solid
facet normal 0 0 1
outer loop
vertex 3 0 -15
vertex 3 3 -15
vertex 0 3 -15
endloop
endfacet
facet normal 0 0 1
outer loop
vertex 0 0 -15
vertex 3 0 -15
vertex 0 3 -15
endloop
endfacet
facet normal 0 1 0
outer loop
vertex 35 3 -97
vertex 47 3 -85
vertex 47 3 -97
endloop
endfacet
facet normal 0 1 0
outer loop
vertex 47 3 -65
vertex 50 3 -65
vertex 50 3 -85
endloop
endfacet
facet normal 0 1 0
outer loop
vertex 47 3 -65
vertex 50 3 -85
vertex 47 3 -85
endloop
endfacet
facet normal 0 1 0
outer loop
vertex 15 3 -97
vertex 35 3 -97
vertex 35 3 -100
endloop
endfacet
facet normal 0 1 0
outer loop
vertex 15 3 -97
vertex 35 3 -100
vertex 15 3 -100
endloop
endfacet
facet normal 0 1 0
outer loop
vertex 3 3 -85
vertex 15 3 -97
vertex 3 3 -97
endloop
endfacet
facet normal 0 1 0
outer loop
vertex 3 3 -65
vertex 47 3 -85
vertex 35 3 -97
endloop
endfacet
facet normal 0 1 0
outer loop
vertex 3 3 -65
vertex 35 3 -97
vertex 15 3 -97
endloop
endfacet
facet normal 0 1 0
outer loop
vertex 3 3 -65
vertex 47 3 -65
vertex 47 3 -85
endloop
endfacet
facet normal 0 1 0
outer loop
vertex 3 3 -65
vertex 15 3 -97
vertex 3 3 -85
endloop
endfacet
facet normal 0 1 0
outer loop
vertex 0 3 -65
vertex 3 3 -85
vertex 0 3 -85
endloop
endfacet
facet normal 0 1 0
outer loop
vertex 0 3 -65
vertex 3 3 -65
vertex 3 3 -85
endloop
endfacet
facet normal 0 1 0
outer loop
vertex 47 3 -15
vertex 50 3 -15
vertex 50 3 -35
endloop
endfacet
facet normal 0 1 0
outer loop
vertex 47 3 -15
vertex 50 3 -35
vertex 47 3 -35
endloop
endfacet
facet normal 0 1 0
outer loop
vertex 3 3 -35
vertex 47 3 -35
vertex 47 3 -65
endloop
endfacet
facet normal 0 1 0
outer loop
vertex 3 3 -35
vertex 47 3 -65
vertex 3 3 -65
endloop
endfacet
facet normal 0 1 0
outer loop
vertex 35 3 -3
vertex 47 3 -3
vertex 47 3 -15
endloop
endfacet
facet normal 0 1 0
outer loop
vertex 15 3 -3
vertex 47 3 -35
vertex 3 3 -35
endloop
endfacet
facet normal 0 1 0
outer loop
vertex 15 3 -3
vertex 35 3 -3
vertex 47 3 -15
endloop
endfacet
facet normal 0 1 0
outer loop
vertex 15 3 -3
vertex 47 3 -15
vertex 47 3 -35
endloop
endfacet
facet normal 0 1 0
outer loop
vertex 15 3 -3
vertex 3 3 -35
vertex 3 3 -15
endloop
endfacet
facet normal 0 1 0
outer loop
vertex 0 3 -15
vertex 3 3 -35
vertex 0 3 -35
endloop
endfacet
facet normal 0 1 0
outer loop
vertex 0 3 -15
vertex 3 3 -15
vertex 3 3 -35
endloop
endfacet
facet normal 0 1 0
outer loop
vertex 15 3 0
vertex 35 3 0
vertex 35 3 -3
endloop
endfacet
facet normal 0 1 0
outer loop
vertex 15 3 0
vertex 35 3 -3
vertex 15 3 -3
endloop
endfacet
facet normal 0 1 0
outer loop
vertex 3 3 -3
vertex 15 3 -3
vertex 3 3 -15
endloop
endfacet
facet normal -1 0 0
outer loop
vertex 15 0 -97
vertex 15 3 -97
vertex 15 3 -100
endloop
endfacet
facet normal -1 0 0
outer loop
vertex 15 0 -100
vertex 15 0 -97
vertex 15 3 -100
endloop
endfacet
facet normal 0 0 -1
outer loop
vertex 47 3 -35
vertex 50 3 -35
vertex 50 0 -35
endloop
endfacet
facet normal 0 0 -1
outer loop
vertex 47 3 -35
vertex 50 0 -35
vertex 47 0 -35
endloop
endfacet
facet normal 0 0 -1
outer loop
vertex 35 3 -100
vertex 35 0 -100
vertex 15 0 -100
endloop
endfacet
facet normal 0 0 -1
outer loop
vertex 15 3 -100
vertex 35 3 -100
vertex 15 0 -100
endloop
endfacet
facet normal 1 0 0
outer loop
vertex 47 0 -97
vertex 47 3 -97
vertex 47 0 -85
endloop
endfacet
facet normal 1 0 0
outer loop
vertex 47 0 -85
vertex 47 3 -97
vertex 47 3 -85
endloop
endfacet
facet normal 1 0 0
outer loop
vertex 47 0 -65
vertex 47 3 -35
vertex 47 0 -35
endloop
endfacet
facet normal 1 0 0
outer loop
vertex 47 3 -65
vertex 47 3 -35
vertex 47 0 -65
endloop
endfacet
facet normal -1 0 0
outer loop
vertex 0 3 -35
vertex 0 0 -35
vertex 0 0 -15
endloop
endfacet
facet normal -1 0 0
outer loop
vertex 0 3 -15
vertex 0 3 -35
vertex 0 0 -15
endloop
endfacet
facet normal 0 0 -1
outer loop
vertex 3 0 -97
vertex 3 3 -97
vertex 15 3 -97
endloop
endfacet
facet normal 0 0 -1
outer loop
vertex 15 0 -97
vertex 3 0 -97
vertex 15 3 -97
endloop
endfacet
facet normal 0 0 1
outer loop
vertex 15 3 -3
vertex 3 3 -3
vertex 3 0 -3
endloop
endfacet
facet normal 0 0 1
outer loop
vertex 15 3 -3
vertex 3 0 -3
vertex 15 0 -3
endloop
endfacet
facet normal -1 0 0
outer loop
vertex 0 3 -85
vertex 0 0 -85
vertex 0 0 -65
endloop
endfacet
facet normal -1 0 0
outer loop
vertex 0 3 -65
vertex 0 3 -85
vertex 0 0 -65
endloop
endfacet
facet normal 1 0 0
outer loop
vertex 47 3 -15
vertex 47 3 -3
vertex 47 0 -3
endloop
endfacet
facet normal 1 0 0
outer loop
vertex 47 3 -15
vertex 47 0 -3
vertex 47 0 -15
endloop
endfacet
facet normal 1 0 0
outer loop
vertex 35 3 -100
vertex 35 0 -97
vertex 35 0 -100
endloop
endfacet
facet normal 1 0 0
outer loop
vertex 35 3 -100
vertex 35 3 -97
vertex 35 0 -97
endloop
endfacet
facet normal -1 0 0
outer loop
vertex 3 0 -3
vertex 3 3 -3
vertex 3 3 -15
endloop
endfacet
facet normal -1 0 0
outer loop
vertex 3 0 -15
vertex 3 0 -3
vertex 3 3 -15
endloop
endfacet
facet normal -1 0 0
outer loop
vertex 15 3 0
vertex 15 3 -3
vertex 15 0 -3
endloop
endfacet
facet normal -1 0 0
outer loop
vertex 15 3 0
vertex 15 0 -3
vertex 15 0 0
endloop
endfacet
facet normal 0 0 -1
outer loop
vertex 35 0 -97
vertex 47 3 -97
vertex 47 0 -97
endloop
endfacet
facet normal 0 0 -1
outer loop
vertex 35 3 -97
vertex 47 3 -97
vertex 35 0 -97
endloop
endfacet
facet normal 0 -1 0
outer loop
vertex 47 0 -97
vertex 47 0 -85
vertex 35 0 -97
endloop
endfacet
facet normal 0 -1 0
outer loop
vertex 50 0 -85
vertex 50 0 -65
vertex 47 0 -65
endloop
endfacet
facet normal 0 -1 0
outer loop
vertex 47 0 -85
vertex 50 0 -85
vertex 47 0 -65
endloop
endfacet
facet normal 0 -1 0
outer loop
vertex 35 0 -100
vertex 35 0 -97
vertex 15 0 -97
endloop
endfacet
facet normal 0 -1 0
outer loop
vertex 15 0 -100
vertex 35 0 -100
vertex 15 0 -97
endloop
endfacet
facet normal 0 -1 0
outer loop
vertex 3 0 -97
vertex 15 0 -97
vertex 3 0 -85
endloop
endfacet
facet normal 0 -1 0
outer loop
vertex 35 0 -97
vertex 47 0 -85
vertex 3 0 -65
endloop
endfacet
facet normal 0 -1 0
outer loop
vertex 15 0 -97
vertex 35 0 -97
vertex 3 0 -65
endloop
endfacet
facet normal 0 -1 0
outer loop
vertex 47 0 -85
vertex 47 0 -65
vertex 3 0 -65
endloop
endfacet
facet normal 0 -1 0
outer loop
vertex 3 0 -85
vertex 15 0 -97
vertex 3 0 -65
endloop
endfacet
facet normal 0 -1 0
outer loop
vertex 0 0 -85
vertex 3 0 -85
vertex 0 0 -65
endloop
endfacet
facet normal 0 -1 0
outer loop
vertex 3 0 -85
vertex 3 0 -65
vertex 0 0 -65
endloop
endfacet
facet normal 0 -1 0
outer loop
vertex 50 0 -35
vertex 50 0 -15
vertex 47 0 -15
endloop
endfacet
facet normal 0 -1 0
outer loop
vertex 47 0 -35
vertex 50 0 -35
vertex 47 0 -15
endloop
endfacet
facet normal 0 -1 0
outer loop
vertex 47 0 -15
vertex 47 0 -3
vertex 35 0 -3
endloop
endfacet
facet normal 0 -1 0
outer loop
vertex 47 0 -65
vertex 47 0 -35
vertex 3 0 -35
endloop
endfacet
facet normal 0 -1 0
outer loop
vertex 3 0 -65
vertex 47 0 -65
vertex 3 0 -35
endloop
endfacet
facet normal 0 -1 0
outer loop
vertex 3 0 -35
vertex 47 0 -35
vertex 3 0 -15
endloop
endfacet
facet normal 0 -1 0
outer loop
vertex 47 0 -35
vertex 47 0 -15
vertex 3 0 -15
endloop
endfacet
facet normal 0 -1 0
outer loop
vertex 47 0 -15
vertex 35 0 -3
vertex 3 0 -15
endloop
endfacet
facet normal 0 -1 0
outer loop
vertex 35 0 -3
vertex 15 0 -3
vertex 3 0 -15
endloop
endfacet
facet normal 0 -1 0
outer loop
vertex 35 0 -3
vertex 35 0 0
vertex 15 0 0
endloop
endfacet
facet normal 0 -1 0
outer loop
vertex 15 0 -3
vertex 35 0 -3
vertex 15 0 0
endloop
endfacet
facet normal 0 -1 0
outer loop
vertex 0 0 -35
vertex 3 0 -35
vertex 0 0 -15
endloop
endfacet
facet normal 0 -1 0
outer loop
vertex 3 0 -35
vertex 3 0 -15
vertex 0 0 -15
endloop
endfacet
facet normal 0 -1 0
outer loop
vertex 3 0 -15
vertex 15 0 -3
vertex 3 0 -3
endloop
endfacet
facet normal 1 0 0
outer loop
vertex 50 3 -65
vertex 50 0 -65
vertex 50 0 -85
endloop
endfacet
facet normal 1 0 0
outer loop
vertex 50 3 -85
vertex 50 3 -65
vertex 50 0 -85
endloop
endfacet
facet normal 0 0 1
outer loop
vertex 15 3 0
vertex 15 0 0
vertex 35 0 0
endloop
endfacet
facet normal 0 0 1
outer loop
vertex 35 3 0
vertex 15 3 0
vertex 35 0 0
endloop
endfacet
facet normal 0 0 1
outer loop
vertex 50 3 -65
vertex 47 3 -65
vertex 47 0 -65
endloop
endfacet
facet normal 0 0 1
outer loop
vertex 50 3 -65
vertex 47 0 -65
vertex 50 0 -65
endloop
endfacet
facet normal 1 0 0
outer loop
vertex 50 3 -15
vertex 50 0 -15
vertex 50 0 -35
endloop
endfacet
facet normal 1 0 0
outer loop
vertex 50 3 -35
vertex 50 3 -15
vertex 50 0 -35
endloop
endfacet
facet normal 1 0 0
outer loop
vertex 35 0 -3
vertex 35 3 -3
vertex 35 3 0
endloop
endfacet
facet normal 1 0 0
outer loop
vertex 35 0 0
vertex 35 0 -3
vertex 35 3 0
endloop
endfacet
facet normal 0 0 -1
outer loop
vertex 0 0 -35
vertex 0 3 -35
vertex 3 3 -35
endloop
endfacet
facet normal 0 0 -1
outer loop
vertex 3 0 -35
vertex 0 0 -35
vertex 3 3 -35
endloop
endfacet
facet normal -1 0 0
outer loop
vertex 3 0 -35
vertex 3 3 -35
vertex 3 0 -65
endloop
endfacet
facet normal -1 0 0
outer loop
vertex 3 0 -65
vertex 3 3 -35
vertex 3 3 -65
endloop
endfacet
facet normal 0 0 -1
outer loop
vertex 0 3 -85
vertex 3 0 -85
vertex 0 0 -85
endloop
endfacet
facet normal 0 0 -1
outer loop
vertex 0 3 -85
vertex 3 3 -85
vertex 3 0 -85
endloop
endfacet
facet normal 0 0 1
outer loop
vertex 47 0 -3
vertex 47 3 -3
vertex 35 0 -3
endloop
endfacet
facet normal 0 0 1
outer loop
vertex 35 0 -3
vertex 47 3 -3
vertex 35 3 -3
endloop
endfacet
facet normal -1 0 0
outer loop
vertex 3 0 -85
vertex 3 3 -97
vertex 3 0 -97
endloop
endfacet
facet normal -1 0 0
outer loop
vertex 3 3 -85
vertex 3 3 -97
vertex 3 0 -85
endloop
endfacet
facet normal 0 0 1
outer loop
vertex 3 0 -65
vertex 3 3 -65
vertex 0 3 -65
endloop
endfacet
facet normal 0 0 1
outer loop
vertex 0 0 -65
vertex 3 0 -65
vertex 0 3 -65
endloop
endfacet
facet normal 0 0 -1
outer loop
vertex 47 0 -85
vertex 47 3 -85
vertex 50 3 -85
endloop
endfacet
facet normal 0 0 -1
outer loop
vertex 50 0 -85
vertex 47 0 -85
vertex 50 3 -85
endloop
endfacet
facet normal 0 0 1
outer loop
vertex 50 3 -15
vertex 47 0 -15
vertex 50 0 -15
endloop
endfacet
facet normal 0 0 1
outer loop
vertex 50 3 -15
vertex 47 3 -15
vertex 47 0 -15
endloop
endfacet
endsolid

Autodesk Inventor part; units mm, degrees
ref_plane "YZ Plane" through (0, 0, 0) normal (1, 0, 0) x (0, 1, 0)
ref_plane "XZ Plane" through (0, 0, 0) normal (0, 1, 0) x (-1, 0, 0)
ref_plane "XY Plane" through (0, 0, 0) normal (0, 0, 1) x (1, 0, 0)
sketch "Sketch1" plane through (0, 0, 0) normal (0, 1, 0) x (-1, 0, 0)
  line L0 (0, 0) -> (-50, 0)
  line L1 (-50, 0) -> (-50, -100)
  line L2 (-50, -100) -> (0, -100)
  line L3 (0, -100) -> (0, 0)
  dimension "d0" = 100
  dimension "d1" = 50
extrude "Base" add sketch "Sketch1" along normal blind 3
sketch "Sketch2" plane through (0, 3, 0) normal (0, 1, 0) x (1, 0, 0)
  line L0 (0, 0) -> (50, 0) projected
  line L1 (50, 100) -> (0, 100) projected
  line L2 (0, 0) -> (3, 0)
  line L3 (3, 100) -> (0, 100)
  line L4 (0, 100) -> (0, 0)
  line L5 (0, 100) -> (0, 0) projected
  line L6 (0, 0) -> (3, 0)
  line L7 (3, 0) -> (3, 15)
  line L8 (3, 15) -> (0, 15)
  line L9 (0, 15) -> (0, 0)
  line L10 (0, 100) -> (3, 100)
  line L11 (3, 100) -> (3, 85)
  line L12 (3, 85) -> (0, 85)
  line L13 (0, 85) -> (0, 100)
  line L14 (0, 35) -> (3, 35)
  line L15 (3, 35) -> (3, 65)
  line L16 (3, 65) -> (0, 65)
  line L17 (0, 65) -> (0, 35)
  line L18 (25, 0) -> (25, 100) construction
  line L19 (50, 0) -> (47, 0)
  line L20 (47, 100) -> (50, 100)
  line L21 (50, 100) -> (50, 0)
  line L22 (50, 100) -> (50, 0)
  line L23 (50, 0) -> (47, 0)
  line L24 (47, 0) -> (47, 15)
  line L25 (47, 15) -> (50, 15)
  line L26 (50, 15) -> (50, 0)
  line L27 (50, 100) -> (47, 100)
  line L28 (47, 100) -> (47, 85)
  line L29 (47, 85) -> (50, 85)
  line L30 (50, 85) -> (50, 100)
  line L31 (50, 35) -> (47, 35)
  line L32 (47, 35) -> (47, 65)
  line L33 (47, 65) -> (50, 65)
  line L34 (50, 65) -> (50, 35)
  line L35 (0, 50) -> (50, 50) construction
  line L36 (50, 0) -> (50, 100) projected
  line L37 (15, 0) -> (3, 0)
  line L38 (3, 0) -> (3, 3)
  line L39 (3, 3) -> (15, 3)
  line L40 (15, 3) -> (15, 0)
  line L41 (50, 0) -> (0, 0)
  line L42 (35, 0) -> (47, 0)
  line L43 (47, 3) -> (35, 3)
  line L44 (35, 3) -> (35, 0)
  line L45 (0, 100) -> (50, 100)
  line L46 (25, 100) -> (25, 0) construction
  line L47 (15, 100) -> (3, 100)
  line L48 (3, 97) -> (15, 97)
  line L49 (15, 97) -> (15, 100)
  line L50 (50, 100) -> (0, 100)
  line L51 (47, 97) -> (35, 97)
  line L52 (35, 100) -> (47, 100)
  line L53 (35, 97) -> (35, 100)
  point P0 (0, 15)
  point P1 (0, 85)
  point P2 (3, 100)
  point P3 (0, 100)
  point P4 (0, 65)
  point P5 (0, 35)
  point P6 (47, 100)
  point P7 (50, 100)
  point P8 (47, 97)
  point P9 (35, 100)
  point P10 (15, 100)
  point P11 (3, 97)
  dimension "d10" = 15
  dimension "d11" = 15
  dimension "d12" = 20
  dimension "d13" = 20
  dimension "d14" = 30
  dimension "d15" = 3
  dimension "d21" = 3
  dimension "d22" = 10
extrude "Tabs" cut sketch "Sketch2" against normal through all contours L4 L8 L7 L0 | L7 L39 L40 L0 | L4 L16 L15 L14 | L44 L43 L24 L0 | L24 L25 L21 L0 | L4 L1 L11 L12 | L1 L49 L48 L11 | L31 L32 L33 L21 | L1 L28 L51 L53 | L29 L28 L1 L21
equation "\"d0\" = Width"
equation "\"d10\" = WidthTabOffset"
equation "\"d11\" = d10"
equation "\"d12\" = BaseTabWidth"
equation "\"d13\" = d12"
equation "\"d15\" = Thickness"
equation "\"d21\" = d15"
equation "\"d22\" = 0.5 * BaseTabWidth"
equation "\"Width\" = 100"
equation "\"WidthTabOffset\" = 15"
equation "\"BaseTabWidth\" = 20"
equation "\"Thickness\" = 3"
properties part number "ShortSide"
